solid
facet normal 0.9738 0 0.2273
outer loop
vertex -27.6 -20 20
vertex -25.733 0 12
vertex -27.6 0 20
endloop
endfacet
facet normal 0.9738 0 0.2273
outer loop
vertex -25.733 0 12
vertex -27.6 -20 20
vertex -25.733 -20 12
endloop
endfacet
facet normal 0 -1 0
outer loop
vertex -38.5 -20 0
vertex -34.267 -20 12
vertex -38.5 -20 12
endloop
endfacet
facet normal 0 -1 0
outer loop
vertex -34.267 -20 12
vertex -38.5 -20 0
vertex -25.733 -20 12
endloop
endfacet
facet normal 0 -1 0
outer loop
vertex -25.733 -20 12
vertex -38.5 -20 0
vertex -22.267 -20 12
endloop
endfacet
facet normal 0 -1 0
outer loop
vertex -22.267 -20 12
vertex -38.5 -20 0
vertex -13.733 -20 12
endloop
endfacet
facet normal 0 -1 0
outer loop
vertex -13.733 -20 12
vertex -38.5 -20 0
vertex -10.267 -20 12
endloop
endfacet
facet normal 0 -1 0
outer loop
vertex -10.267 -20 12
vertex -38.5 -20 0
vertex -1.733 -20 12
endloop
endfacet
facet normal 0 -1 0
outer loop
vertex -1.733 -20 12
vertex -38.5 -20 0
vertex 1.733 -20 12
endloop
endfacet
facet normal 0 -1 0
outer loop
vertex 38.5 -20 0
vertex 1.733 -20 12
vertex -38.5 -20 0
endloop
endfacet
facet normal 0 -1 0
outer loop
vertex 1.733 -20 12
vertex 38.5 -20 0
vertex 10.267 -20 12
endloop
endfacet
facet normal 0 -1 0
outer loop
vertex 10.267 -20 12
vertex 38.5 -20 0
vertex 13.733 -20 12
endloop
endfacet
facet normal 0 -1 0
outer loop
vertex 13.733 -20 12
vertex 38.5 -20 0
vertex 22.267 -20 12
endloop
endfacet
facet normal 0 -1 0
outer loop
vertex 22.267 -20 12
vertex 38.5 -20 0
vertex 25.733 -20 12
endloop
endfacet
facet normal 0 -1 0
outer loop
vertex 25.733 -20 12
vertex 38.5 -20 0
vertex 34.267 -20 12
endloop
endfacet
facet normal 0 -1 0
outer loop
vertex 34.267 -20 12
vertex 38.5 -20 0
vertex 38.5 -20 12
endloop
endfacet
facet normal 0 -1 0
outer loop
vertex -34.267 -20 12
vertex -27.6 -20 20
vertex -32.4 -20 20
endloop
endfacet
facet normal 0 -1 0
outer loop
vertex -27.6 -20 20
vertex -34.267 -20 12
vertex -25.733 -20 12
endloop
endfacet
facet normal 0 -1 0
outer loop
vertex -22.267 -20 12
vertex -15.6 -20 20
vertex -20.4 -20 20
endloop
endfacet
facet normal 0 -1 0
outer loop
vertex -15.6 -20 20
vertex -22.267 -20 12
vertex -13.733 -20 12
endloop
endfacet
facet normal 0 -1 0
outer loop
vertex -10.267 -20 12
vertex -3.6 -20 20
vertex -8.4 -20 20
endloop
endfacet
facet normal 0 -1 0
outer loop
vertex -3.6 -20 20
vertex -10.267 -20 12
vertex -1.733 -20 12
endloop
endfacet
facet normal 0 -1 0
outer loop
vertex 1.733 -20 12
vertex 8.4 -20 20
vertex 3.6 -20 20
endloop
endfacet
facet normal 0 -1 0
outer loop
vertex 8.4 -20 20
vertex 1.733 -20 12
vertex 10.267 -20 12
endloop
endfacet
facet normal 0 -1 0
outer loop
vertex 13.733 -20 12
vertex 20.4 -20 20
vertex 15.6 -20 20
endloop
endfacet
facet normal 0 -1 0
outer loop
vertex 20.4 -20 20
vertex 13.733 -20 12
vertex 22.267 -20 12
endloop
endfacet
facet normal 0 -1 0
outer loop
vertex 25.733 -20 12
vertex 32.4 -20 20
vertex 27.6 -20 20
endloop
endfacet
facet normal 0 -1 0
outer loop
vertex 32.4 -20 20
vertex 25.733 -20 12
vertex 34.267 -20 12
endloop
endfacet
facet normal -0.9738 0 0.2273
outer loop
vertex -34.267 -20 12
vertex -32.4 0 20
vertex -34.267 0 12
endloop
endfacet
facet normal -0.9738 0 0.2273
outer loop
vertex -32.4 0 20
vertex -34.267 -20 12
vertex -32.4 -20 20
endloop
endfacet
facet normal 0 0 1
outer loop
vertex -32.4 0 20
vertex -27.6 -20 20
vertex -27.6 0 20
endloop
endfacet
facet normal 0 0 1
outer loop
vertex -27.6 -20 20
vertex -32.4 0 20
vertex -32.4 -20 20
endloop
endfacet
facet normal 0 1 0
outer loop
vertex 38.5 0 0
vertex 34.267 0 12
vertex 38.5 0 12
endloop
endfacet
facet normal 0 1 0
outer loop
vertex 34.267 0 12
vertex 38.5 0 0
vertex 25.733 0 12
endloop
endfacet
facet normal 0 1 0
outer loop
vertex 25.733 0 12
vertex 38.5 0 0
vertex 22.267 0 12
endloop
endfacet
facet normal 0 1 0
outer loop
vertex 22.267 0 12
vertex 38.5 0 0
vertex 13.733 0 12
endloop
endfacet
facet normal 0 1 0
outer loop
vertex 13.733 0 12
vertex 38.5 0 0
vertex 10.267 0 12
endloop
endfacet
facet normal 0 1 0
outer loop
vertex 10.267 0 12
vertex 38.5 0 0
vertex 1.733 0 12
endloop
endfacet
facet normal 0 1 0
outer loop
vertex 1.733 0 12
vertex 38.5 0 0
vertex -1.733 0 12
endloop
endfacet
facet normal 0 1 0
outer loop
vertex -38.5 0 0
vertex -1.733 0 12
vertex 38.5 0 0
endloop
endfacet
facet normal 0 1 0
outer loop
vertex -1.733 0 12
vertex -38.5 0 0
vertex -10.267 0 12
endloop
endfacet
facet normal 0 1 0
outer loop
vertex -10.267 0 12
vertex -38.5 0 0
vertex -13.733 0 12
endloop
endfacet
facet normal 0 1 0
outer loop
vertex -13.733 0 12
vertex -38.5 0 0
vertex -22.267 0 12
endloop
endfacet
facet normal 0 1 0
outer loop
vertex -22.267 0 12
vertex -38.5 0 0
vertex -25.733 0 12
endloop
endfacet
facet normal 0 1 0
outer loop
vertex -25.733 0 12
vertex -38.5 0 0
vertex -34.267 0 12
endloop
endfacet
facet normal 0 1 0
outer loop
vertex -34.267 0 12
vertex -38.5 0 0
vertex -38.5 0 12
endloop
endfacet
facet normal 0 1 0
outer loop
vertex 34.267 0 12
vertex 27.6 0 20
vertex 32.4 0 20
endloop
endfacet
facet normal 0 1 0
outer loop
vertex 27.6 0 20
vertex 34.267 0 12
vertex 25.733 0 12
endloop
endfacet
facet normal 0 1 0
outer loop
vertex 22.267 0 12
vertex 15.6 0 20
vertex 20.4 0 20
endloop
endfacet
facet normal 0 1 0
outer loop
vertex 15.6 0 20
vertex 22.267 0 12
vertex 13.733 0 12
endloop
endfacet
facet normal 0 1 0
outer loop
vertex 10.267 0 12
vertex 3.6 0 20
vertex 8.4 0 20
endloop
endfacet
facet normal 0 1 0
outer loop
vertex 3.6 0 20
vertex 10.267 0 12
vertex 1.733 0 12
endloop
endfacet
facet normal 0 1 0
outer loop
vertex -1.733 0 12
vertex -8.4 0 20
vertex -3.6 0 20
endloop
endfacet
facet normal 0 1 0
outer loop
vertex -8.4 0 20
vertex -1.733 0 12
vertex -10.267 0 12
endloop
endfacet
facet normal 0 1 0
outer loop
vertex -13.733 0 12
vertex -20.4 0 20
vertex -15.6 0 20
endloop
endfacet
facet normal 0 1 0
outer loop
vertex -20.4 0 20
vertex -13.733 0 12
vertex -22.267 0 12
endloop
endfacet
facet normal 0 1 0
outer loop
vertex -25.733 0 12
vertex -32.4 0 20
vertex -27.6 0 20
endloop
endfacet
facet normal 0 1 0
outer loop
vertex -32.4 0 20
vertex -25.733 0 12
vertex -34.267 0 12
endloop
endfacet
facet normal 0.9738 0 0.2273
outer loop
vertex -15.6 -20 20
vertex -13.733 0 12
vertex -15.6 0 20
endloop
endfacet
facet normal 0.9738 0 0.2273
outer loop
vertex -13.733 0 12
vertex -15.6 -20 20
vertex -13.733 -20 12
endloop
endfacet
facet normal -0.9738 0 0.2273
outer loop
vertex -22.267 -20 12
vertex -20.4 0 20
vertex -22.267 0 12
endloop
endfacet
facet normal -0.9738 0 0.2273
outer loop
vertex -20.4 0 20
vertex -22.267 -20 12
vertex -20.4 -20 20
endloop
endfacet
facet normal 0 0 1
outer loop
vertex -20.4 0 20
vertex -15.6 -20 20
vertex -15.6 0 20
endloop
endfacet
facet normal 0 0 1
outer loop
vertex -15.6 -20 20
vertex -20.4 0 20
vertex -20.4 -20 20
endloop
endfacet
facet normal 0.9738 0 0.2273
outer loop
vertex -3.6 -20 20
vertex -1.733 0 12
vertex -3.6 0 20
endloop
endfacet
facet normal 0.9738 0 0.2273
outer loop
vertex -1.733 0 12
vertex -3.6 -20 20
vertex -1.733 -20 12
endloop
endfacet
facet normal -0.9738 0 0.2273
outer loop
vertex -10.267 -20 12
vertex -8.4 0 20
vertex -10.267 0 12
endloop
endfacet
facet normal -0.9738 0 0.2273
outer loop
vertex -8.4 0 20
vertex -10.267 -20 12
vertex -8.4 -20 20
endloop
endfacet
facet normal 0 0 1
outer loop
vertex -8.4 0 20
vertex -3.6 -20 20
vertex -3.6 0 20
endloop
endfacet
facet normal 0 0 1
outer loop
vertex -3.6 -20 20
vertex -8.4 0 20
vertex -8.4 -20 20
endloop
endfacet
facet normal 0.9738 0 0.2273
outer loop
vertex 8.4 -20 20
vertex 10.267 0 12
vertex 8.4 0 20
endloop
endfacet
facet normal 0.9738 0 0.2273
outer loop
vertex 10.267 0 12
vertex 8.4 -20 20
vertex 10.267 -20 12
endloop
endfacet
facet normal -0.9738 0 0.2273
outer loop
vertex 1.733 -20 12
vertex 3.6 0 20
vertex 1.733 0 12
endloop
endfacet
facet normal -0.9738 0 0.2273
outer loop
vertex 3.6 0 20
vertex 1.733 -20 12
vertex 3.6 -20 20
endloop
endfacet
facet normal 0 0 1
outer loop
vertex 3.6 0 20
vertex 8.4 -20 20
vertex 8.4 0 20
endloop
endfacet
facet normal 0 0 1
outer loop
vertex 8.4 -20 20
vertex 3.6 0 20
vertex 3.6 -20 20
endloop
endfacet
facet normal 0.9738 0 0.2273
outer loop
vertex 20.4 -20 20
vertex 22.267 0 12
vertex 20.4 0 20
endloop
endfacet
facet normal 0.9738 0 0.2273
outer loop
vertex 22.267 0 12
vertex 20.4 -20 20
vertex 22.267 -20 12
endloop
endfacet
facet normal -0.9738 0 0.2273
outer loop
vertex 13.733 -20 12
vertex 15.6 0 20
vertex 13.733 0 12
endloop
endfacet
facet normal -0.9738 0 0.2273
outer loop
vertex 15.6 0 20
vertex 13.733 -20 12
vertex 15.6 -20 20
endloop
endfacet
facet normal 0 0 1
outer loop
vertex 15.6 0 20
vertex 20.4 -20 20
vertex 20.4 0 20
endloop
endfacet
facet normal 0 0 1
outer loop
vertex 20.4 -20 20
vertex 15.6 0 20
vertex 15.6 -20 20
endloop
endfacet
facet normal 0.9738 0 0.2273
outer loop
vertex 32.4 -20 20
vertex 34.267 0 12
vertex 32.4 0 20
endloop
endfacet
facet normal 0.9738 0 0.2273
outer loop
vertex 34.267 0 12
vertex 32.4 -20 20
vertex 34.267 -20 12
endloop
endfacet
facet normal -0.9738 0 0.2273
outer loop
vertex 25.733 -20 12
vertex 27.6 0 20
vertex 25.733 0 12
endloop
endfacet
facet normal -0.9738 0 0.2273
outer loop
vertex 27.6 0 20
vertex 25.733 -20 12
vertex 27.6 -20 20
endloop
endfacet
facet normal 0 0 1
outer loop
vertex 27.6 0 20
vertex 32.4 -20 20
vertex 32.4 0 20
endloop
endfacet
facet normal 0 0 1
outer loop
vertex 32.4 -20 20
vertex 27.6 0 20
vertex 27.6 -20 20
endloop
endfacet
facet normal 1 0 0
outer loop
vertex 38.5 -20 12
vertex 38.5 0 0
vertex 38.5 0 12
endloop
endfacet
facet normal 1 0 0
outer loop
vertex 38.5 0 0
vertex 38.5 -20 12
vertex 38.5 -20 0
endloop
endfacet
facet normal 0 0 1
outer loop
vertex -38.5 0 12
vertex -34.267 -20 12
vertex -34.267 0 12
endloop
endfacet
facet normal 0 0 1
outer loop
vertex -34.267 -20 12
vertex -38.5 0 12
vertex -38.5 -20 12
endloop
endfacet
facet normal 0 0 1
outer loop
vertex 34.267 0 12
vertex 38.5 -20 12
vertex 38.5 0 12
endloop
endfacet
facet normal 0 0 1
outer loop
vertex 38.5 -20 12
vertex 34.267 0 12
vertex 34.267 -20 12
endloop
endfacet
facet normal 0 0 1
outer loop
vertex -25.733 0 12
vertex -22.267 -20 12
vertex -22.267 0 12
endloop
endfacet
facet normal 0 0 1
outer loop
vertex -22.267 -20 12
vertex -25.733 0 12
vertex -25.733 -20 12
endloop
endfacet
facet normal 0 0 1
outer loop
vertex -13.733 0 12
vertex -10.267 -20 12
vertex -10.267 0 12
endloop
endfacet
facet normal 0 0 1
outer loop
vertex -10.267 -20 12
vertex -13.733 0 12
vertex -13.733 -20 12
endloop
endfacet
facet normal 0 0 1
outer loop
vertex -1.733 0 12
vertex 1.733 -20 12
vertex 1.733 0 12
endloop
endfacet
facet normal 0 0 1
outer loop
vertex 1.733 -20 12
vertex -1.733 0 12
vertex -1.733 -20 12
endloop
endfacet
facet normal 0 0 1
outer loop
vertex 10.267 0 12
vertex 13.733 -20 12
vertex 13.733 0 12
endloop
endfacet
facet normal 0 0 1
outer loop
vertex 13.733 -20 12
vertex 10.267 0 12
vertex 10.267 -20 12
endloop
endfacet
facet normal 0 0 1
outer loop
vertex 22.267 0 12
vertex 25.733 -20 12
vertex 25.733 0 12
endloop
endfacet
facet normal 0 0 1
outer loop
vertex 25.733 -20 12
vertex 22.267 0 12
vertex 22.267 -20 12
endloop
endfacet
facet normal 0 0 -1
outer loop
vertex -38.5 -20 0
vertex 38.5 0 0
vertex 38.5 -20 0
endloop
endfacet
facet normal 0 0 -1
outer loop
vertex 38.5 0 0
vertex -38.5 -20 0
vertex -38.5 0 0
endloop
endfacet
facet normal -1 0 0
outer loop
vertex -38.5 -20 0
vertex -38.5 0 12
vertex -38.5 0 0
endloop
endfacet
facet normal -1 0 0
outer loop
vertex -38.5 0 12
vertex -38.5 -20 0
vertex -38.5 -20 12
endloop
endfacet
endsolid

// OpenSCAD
$fn = 32;

// ----------------------------------------------------------------------
// Toothed rack, 6 teeth
// 12 mm pitch, 8 mm teeth
// ----------------------------------------------------------------------

// --- parameters (mm) ---
bar_w = 20;     // bar width (Y)
bar_h = 12;     // bar height (Z)
teeth = 6;      // number of teeth
pitch = 12;     // tooth pitch
tooth_h = 8;    // tooth height above the bar
root_w = 9;     // tooth width at the root
crest_w = 4.8;  // tooth width at the crest

// --- derived feature positions (mm) ---
span = (teeth - 1) * pitch;  // = 60   distance between the outer teeth
bar_l = span + root_w + 8;   // = 77   bar length: teeth plus 4 mm at each end
tooth_x = -span / 2;         // = -30   X of the first tooth
height = bar_h + tooth_h;    // = 20   overall height
feature_centers = [
  [tooth_x + 0 * pitch, -bar_w / 2],
  [tooth_x + 1 * pitch, -bar_w / 2],
  [tooth_x + 2 * pitch, -bar_w / 2],
  [tooth_x + 3 * pitch, -bar_w / 2],
  [tooth_x + 4 * pitch, -bar_w / 2],
  [tooth_x + 5 * pitch, -bar_w / 2]
];   // tooth centre line, drives the tooth loop

// bar with a rack of teeth, one extruded trapezoium per centre
module rack_tooth() {
  linear_extrude(height = bar_w)
    polygon(points = [
      [0, 0],
      [root_w, 0],
      [root_w / 2 + crest_w / 2, tooth_h + 1],
      [root_w / 2 - crest_w / 2, tooth_h + 1]
    ]);
}

union() {
  translate([-bar_l / 2, -bar_w, 0]) cube([bar_l, bar_w, bar_h]);
  for (centre = feature_centers)
    translate([centre[0] - root_w / 2, 0, bar_h - 1]) rotate([90, 0, 0]) rack_tooth();
}
